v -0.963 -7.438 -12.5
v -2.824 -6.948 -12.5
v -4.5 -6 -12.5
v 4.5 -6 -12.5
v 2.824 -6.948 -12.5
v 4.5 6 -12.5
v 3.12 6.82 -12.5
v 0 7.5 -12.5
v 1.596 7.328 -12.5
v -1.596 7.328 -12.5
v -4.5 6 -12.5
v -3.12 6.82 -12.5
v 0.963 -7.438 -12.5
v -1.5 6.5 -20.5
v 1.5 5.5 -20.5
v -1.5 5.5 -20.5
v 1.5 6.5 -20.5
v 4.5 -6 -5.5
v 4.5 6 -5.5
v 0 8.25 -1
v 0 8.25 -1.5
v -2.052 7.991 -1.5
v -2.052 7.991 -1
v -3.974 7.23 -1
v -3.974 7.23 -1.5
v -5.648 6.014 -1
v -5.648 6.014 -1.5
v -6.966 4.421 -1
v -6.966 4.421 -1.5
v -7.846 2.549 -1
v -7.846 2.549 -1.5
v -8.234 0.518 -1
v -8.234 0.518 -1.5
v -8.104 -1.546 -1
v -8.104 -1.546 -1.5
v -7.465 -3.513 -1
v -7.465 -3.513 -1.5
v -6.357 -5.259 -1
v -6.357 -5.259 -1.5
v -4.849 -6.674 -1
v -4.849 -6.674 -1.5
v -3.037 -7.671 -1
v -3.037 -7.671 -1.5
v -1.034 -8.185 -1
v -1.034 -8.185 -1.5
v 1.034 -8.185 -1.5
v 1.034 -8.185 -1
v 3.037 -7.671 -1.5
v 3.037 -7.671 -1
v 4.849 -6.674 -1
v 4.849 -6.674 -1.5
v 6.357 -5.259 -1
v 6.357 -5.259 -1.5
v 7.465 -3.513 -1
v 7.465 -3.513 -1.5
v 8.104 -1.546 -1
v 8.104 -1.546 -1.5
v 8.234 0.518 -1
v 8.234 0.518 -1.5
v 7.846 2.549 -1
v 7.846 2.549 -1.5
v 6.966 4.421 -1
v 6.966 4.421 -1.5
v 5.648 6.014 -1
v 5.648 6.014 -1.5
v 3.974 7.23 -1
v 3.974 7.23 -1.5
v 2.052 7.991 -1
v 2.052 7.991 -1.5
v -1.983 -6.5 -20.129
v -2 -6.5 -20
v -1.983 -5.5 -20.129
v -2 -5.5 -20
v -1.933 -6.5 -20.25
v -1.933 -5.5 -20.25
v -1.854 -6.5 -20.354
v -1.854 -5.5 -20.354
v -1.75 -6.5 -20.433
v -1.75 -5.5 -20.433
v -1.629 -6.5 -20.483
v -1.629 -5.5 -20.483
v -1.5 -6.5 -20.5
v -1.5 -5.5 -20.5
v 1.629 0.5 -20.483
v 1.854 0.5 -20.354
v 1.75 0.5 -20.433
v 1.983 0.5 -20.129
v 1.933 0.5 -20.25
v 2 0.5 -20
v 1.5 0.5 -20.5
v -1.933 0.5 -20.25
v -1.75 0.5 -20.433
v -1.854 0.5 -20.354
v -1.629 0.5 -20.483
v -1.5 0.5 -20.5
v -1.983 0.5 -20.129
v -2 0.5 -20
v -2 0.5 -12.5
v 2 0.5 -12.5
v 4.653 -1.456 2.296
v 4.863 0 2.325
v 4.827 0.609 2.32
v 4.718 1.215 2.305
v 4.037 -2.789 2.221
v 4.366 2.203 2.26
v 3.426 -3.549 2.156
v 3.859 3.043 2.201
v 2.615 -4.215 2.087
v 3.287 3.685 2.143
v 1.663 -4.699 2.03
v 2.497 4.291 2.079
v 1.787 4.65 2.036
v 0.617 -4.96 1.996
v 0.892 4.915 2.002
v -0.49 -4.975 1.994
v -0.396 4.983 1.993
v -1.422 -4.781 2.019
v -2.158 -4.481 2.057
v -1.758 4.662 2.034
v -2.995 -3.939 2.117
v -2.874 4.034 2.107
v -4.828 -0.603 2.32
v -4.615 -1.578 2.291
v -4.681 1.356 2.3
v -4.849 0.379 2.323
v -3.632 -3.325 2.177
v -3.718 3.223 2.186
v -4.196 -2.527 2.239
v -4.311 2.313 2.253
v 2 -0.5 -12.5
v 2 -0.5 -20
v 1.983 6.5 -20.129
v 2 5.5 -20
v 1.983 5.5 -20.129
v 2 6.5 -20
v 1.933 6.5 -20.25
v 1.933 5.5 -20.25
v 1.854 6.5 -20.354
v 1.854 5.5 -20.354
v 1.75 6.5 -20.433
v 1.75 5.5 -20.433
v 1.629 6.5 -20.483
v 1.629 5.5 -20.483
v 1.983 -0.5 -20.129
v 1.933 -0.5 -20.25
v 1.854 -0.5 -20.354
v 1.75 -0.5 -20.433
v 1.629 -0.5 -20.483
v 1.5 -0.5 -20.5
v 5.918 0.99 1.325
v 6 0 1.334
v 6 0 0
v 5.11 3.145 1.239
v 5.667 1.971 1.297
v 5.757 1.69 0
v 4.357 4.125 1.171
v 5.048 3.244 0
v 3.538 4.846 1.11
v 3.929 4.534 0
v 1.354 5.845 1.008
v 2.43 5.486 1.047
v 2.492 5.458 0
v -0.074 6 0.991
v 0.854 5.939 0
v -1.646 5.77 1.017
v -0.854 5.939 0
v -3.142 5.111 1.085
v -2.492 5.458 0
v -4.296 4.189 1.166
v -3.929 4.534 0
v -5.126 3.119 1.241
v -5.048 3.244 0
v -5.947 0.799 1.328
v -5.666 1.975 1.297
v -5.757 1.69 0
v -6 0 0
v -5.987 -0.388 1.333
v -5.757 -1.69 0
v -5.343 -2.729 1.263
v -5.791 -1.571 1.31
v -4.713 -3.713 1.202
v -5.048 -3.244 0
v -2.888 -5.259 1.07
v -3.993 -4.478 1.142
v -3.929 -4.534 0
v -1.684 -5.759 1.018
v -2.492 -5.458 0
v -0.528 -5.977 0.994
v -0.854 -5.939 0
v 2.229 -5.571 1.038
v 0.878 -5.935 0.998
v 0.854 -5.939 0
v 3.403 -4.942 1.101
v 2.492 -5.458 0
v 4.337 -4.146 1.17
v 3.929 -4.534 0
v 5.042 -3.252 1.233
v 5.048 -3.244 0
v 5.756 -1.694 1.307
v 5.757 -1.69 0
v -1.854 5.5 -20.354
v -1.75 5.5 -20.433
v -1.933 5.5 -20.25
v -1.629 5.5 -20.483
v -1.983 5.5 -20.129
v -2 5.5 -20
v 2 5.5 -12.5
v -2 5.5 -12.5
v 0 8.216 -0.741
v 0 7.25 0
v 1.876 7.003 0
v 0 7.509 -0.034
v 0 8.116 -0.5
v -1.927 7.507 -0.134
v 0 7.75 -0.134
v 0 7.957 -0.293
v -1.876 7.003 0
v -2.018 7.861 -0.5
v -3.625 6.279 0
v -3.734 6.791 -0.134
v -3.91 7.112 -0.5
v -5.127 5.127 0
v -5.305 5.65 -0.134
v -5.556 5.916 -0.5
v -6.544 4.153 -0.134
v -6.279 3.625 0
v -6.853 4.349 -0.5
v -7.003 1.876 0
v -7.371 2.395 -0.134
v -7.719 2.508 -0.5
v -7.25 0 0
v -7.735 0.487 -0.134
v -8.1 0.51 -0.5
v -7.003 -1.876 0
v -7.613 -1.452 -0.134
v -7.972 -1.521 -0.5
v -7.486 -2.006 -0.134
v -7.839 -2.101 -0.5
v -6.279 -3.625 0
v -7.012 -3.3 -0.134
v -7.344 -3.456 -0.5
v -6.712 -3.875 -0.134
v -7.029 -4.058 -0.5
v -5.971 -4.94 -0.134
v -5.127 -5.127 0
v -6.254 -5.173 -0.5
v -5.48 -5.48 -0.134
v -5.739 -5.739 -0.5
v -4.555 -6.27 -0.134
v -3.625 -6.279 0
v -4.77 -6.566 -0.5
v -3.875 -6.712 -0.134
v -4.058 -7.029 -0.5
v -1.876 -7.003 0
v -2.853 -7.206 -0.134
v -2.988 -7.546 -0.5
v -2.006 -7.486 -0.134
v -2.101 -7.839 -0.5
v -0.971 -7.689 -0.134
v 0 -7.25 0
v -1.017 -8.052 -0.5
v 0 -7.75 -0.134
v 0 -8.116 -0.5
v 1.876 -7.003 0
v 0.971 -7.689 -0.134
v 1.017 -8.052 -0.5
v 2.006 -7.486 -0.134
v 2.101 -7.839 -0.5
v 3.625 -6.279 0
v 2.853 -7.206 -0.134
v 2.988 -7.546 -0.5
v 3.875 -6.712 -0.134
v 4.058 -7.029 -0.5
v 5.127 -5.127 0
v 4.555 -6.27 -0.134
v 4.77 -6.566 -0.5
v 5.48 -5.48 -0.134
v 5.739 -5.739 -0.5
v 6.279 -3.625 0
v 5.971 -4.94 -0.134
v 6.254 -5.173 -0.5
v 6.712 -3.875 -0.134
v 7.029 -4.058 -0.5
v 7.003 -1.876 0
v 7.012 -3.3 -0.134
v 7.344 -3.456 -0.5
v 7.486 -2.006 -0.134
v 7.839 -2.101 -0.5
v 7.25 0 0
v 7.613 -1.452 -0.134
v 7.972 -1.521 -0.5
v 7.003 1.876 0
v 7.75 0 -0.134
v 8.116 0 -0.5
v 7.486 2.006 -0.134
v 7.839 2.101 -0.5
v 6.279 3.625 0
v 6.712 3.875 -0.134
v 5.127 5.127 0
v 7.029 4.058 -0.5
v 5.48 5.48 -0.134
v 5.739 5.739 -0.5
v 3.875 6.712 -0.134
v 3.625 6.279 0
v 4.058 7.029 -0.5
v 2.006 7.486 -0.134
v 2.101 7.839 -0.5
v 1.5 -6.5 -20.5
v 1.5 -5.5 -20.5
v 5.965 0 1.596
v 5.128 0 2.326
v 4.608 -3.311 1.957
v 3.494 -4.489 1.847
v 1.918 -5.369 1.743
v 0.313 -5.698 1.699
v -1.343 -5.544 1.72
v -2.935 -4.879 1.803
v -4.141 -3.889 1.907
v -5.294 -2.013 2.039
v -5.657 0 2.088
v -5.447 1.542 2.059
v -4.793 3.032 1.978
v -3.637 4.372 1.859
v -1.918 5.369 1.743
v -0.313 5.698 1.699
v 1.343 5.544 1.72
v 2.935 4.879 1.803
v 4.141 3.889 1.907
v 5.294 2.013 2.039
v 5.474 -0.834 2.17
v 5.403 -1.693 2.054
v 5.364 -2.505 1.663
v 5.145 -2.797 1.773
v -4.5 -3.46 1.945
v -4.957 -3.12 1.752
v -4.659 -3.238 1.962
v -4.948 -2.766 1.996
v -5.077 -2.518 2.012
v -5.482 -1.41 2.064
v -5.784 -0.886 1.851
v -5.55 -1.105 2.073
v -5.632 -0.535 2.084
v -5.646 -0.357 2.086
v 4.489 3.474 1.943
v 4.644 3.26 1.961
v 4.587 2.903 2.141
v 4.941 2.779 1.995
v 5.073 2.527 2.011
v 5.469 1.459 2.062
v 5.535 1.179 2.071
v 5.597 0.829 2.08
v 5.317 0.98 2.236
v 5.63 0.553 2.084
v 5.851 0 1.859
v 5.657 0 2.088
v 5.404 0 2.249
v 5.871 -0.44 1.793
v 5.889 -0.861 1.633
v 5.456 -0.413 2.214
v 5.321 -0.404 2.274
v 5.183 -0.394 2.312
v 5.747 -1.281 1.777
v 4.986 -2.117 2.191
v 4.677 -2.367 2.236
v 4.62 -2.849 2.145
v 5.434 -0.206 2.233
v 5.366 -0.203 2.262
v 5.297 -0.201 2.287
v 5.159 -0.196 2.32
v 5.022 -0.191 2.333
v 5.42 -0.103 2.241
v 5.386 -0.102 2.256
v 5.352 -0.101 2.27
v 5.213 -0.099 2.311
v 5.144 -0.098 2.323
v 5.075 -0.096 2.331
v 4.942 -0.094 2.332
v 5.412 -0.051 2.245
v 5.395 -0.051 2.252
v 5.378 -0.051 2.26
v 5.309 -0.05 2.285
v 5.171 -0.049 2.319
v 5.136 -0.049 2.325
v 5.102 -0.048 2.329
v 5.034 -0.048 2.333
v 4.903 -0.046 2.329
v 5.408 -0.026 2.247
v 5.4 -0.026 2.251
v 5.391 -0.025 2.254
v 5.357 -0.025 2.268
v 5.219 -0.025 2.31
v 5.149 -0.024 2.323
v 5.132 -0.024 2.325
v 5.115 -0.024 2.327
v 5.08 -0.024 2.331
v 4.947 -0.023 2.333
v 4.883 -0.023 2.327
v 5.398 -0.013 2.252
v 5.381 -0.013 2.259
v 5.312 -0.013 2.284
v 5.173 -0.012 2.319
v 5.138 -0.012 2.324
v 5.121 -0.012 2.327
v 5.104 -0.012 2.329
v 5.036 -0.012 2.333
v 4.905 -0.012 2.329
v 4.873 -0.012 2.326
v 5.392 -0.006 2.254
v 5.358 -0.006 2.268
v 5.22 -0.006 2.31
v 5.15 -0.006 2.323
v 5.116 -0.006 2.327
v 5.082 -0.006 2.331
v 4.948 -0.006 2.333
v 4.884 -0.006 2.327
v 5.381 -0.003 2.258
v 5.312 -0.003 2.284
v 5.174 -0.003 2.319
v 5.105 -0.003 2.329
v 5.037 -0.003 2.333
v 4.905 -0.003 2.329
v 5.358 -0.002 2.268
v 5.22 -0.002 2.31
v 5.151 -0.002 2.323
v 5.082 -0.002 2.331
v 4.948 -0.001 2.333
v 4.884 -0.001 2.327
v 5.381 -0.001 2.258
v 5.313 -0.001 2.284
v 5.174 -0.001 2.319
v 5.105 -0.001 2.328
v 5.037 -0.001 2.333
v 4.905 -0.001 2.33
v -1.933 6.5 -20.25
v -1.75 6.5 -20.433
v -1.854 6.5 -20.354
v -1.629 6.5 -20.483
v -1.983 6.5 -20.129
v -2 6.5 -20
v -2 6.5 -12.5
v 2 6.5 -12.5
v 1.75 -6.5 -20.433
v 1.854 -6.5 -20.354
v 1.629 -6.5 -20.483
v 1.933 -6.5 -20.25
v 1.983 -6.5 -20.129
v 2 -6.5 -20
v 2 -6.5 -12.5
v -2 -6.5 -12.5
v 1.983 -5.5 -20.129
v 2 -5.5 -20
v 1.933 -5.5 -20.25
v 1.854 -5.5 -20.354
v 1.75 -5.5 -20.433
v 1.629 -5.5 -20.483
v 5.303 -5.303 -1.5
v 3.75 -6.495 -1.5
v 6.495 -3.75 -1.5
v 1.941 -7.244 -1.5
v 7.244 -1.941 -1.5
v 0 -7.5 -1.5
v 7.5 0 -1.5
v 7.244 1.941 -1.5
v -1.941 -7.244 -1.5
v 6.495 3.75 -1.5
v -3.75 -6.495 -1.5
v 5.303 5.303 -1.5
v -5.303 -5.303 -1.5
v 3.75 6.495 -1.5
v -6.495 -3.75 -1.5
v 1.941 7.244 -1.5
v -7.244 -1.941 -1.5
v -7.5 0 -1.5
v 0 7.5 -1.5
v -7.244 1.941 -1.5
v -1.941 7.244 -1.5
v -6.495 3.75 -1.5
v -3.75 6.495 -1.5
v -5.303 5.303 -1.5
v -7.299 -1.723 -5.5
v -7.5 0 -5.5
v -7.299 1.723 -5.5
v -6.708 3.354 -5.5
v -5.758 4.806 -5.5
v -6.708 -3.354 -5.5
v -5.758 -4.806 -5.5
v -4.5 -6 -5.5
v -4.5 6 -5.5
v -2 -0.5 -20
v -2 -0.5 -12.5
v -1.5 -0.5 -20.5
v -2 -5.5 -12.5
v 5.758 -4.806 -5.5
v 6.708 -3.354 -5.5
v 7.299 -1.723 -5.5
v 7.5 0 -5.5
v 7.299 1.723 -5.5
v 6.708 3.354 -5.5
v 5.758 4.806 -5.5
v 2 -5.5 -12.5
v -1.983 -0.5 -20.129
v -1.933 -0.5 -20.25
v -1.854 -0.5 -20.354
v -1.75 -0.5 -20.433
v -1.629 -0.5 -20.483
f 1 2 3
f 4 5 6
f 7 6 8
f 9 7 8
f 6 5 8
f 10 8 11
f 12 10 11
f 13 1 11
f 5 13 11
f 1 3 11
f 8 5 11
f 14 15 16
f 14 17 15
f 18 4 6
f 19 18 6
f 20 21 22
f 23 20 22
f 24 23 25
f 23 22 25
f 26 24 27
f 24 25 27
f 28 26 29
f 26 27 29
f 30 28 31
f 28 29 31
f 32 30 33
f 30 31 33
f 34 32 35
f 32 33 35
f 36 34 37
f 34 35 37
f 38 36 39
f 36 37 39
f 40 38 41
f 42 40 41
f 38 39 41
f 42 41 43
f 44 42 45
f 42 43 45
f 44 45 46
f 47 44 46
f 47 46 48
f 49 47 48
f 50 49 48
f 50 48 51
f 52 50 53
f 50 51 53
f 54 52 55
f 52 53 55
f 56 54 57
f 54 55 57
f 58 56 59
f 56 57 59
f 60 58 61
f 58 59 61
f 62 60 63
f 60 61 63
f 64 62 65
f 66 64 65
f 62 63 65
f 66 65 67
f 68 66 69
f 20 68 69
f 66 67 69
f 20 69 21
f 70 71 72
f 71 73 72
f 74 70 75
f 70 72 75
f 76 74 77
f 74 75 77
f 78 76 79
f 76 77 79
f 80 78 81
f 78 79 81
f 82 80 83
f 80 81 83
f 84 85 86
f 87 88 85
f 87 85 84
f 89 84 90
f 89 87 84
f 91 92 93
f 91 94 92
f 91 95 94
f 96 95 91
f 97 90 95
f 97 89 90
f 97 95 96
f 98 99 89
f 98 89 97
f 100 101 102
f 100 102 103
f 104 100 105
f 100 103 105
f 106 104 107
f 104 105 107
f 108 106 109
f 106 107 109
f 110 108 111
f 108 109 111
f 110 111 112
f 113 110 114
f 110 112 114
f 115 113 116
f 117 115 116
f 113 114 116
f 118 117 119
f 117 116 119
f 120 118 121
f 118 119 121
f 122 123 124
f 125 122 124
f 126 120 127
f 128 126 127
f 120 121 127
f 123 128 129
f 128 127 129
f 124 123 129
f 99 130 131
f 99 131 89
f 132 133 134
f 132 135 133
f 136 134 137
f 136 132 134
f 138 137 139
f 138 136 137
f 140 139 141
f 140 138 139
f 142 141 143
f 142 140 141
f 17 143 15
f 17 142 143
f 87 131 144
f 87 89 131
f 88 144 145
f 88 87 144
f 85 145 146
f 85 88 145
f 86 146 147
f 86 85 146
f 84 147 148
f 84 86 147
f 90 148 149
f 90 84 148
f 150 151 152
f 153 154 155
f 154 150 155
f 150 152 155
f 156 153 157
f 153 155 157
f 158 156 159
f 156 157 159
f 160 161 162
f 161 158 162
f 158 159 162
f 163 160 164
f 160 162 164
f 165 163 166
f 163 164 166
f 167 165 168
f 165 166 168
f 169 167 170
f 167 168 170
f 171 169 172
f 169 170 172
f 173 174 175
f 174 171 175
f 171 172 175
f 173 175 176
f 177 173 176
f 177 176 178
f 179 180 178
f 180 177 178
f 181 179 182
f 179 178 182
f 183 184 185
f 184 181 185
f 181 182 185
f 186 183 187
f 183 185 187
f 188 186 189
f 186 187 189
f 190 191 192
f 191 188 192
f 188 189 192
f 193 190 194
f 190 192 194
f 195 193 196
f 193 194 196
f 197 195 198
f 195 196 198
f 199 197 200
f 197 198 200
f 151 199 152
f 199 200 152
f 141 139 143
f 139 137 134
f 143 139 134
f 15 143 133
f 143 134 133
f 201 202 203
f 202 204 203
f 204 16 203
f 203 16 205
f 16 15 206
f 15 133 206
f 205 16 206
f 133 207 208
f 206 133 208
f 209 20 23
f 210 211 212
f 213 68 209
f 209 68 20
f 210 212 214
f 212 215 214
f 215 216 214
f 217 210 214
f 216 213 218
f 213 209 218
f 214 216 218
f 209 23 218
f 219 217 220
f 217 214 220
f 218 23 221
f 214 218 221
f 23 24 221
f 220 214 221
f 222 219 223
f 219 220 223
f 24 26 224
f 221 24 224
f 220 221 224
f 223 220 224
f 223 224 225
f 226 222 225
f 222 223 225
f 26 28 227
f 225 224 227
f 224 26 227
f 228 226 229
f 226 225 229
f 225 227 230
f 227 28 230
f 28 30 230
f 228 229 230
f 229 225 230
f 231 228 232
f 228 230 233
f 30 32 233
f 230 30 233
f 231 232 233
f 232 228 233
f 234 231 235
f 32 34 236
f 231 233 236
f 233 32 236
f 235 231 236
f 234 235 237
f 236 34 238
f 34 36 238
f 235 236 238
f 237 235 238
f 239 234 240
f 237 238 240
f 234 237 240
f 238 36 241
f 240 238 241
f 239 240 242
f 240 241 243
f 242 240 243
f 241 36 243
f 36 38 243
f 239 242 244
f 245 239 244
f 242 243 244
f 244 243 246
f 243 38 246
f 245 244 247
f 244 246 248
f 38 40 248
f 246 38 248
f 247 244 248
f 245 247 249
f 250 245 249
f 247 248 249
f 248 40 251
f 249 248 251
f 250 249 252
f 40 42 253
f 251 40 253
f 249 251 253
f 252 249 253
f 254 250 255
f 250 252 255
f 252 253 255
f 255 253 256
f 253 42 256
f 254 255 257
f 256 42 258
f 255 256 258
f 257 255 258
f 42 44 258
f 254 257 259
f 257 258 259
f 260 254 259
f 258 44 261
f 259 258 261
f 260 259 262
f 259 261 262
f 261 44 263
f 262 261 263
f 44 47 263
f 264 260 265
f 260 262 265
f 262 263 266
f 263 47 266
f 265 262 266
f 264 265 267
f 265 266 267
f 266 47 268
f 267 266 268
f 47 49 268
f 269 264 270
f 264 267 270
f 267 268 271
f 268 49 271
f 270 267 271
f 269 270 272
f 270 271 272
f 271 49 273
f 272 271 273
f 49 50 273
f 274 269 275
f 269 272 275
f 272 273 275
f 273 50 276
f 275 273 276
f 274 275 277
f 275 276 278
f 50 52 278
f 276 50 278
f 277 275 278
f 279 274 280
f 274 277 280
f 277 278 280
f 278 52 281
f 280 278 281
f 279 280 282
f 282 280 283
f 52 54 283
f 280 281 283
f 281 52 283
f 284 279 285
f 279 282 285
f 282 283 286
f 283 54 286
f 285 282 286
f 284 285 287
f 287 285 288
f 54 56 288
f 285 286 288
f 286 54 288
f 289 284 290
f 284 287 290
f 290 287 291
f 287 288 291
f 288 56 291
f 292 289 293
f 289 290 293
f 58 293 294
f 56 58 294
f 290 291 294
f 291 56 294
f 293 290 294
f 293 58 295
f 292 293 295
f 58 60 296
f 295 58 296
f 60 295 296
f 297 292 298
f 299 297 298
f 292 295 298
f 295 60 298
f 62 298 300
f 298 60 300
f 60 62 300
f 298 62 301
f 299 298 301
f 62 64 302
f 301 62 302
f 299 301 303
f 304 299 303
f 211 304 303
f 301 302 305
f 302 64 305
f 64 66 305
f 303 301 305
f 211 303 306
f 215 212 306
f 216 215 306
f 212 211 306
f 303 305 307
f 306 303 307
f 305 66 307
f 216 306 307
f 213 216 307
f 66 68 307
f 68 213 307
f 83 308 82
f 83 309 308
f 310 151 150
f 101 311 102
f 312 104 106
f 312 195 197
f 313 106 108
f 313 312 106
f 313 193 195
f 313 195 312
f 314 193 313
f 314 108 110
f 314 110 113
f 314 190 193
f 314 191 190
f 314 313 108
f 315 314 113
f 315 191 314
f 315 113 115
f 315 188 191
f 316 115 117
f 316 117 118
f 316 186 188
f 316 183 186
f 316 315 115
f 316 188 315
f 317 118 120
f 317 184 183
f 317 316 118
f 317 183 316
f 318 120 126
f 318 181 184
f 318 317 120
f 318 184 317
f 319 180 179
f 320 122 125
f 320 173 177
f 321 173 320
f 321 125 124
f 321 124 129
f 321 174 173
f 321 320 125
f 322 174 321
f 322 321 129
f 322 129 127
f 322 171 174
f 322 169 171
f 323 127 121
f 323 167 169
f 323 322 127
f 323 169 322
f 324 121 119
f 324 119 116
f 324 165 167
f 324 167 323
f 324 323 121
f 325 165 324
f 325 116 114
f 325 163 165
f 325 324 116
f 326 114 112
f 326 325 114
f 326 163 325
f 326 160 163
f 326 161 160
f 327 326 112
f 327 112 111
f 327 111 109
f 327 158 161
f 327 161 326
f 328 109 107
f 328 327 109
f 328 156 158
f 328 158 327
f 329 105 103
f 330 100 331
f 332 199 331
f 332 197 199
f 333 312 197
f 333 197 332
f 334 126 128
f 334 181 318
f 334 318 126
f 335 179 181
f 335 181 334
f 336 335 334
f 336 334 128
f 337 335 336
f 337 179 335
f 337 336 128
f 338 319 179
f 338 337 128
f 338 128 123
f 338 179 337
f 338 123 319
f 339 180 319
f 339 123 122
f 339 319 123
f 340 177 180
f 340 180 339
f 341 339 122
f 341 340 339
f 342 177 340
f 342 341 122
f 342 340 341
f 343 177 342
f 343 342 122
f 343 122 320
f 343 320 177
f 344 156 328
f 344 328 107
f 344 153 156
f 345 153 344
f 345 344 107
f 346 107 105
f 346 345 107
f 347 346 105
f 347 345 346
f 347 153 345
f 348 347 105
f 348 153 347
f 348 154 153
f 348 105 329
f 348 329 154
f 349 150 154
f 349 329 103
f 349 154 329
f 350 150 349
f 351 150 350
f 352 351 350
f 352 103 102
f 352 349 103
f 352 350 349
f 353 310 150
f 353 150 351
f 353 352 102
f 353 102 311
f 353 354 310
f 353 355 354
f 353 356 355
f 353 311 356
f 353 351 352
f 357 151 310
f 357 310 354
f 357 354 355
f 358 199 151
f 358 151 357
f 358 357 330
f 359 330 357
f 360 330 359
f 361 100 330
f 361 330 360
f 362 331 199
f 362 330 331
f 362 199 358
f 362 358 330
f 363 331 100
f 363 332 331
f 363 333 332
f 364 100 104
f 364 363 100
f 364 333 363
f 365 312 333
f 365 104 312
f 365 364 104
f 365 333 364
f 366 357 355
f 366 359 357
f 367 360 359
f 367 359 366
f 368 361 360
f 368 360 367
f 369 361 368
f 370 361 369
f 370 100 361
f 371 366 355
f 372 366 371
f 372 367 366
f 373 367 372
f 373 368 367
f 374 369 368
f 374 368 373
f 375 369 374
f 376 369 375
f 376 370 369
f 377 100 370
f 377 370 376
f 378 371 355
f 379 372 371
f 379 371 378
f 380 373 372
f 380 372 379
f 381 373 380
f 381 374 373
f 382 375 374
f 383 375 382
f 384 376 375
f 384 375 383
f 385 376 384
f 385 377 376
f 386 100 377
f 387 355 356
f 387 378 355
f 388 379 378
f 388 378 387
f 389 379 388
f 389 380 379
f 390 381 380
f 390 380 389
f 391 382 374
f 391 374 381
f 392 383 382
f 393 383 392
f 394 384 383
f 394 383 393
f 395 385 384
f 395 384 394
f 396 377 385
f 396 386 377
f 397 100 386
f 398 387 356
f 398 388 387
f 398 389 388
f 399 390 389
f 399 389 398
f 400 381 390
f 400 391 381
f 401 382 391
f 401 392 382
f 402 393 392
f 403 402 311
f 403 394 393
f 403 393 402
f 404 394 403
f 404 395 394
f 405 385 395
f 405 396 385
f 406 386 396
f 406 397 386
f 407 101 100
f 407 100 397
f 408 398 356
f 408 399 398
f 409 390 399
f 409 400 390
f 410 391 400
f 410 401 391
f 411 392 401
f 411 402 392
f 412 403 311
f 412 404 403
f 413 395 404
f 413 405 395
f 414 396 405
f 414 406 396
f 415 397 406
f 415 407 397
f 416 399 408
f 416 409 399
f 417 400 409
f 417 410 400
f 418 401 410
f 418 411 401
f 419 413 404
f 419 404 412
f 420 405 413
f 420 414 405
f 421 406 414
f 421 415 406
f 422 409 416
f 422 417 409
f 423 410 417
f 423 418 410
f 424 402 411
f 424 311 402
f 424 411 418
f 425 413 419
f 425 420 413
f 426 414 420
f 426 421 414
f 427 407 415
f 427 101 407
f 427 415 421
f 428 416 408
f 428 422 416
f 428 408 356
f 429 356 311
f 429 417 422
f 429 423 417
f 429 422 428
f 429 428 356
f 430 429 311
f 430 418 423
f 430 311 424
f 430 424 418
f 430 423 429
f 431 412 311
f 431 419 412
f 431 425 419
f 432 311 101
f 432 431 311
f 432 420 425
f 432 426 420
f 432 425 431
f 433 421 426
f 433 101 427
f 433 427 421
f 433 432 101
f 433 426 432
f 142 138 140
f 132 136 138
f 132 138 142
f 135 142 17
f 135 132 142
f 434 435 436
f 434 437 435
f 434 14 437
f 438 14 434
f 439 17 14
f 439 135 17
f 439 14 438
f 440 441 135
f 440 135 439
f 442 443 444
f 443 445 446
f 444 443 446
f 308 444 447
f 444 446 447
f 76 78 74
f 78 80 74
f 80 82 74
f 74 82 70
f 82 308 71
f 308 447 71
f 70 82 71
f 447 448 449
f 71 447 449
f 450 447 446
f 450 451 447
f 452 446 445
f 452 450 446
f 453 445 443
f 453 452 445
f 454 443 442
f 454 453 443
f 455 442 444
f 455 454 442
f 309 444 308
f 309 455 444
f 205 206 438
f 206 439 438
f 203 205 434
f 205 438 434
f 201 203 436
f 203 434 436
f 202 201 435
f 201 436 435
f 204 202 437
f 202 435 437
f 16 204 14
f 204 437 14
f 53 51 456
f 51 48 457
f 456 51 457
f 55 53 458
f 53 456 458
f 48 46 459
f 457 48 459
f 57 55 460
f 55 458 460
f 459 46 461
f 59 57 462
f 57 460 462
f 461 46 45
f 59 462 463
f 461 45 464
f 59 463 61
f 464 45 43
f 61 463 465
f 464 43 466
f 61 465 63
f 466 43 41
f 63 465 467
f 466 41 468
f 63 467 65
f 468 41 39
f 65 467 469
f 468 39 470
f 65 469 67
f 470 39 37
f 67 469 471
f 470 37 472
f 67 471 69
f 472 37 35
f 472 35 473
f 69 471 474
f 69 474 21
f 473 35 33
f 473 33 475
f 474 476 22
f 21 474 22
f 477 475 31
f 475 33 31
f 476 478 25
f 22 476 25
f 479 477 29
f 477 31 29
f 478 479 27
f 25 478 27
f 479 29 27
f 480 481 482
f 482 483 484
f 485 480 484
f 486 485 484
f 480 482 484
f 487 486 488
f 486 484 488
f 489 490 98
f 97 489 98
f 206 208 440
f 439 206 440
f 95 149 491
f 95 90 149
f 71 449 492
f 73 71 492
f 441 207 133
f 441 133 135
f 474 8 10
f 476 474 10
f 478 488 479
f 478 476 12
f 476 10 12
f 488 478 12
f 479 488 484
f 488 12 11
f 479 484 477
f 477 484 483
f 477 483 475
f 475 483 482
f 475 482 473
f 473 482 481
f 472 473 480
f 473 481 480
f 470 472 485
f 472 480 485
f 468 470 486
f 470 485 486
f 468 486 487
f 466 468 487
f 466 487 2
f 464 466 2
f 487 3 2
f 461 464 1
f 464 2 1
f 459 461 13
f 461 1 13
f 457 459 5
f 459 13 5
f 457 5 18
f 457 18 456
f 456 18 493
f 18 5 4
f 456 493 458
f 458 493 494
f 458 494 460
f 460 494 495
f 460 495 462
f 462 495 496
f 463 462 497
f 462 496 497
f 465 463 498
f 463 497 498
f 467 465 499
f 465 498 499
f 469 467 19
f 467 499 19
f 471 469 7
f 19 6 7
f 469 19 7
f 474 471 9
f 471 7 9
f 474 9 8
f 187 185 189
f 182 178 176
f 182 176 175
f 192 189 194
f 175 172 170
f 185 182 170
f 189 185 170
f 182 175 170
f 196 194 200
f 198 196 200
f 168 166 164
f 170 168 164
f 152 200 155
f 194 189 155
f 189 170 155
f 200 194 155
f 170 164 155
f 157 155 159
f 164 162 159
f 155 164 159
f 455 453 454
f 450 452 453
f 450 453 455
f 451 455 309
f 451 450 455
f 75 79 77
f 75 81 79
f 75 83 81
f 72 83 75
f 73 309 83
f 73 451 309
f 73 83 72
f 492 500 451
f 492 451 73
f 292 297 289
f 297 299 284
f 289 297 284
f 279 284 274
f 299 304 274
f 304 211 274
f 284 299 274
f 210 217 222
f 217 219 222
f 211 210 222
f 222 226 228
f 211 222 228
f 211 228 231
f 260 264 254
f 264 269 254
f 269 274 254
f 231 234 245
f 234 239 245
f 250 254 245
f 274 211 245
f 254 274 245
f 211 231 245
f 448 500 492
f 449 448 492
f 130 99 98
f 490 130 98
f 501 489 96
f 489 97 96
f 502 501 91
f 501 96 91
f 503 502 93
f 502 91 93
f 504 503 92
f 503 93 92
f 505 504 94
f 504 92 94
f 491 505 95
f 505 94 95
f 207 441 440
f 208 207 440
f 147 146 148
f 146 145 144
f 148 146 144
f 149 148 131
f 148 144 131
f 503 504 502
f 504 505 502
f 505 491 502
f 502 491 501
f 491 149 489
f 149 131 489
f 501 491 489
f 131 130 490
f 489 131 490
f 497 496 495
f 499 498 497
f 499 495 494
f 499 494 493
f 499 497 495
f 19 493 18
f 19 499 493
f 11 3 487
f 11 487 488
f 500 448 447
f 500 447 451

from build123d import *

# Parameters (mm, degrees)
CUT_EXTRUDE_1_DEPTH = 7
SKETCH_3_R          = 6
EXTRUDE_1_DEPTH     = 2.5
CUT_EXTRUDE_2_DEPTH = 7.5
FILLET_1_R          = 1
FILLET_2_R          = 1
SKETCH_5_W          = 4
SKETCH_5_H          = 1
EXTRUDE_2_DEPTH     = 8
EXTRUDE_2_2_DEPTH   = 8
EXTRUDE_2_3_DEPTH   = 8
FILLET_3_R          = 0.5
FILLET_4_R          = 0.5
FILLET_5_R          = 0.5


with BuildPart() as part:
    # Эскиз1 → Повернуть1 (revolve)
    with BuildSketch(Plane(origin=(0, 0, 0), x_dir=(0, 0, -1), z_dir=(1, 0, 0))):
        Polygon((0, 0), (0, 8.25), (1.5, 8.25), (1.5, 7.5), (12.5, 7.5), (12.5, 0), align=None)
    revolve(axis=Axis((0, 0, -12.5), (0, 0, 1)))

    # Эскиз2 → Вырез-Вытянуть1 (cut)
    with BuildSketch(Plane(origin=(0, 0, -12.5), x_dir=(-1, 0, 0), z_dir=(0, 0, -1))):
        with BuildLine():
            Line((-4.5, -6), (-4.5, 6))
            ThreePointArc((-4.5, 6), (-7.5, 0), (-4.5, -6))
        make_face()
        with BuildLine():
            Line((4.5, -6), (4.5, 6))
            ThreePointArc((4.5, 6), (7.5, 0), (4.5, -6))
        make_face()
    extrude(amount=-CUT_EXTRUDE_1_DEPTH, mode=Mode.SUBTRACT)

    # Скругление2
    fillet_2_edges = [part.edges().sort_by_distance(p)[0] for p in [
        (0, -8.25, 0),
    ]]
    fillet(fillet_2_edges, radius=FILLET_2_R)


with BuildPart() as body_2:
    # Эскиз3 → Бобышка-Вытянуть1 (new body)
    with BuildSketch(Plane.XY):
        Circle(SKETCH_3_R)
    extrude(amount=EXTRUDE_1_DEPTH)

    # Эскиз4 → Вырез-Вытянуть2 (cut, symmetric)
    with BuildSketch(Plane(origin=(0, 0, 0), x_dir=(1, 0, 0), z_dir=(0, 1, 0))):
        with BuildLine():
            Line((-6, -2.5), (6, -2.5))
            ThreePointArc((6, -2.5), (0, -1.991065566), (-6, -2.5))
        make_face()
    extrude(amount=CUT_EXTRUDE_2_DEPTH, both=True, mode=Mode.SUBTRACT)

    # Скругление1
    fillet_1_edges = [body_2.edges().sort_by_distance(p)[0] for p in [
        (-6, 5.7e-07, 2.5),
    ]]
    fillet(fillet_1_edges, radius=FILLET_1_R)


with BuildPart() as body_3:
    # Эскиз5 → Бобышка-Вытянуть2 (new body)
    with BuildSketch(Plane(origin=(0, 0, -12.5), x_dir=(-1, 0, 0), z_dir=(0, 0, -1))):
        with Locations((0, 6)):
            Rectangle(SKETCH_5_W, SKETCH_5_H)
    extrude(amount=EXTRUDE_2_DEPTH)

    # Скругление5
    fillet_5_edges = [body_3.edges().sort_by_distance(p)[0] for p in [
        (-2, 6, -20.5),
        (2, 6, -20.5),
    ]]
    fillet(fillet_5_edges, radius=FILLET_5_R)


with BuildPart() as body_4:
    # Эскиз5 → Extrude 2 2 (new body)
    with BuildSketch(Plane(origin=(0, 0, -12.5), x_dir=(-1, 0, 0), z_dir=(0, 0, -1))):
        Rectangle(SKETCH_5_W, SKETCH_5_H)
    extrude(amount=EXTRUDE_2_2_DEPTH)

    # Скругление4
    fillet_4_edges = [body_4.edges().sort_by_distance(p)[0] for p in [
        (-2, 0, -20.5),
        (2, 0, -20.5),
    ]]
    fillet(fillet_4_edges, radius=FILLET_4_R)


with BuildPart() as body_5:
    # Эскиз5 → Extrude 2 3 (new body)
    with BuildSketch(Plane(origin=(0, 0, -12.5), x_dir=(-1, 0, 0), z_dir=(0, 0, -1))):
        with Locations((0, -6)):
            Rectangle(SKETCH_5_W, SKETCH_5_H)
    extrude(amount=EXTRUDE_2_3_DEPTH)

    # Скругление3
    fillet_3_edges = [body_5.edges().sort_by_distance(p)[0] for p in [
        (-2, -6, -20.5),
        (2, -6, -20.5),
    ]]
    fillet(fillet_3_edges, radius=FILLET_3_R)


solid = Compound([part.part, body_2.part, body_3.part, body_4.part, body_5.part])
